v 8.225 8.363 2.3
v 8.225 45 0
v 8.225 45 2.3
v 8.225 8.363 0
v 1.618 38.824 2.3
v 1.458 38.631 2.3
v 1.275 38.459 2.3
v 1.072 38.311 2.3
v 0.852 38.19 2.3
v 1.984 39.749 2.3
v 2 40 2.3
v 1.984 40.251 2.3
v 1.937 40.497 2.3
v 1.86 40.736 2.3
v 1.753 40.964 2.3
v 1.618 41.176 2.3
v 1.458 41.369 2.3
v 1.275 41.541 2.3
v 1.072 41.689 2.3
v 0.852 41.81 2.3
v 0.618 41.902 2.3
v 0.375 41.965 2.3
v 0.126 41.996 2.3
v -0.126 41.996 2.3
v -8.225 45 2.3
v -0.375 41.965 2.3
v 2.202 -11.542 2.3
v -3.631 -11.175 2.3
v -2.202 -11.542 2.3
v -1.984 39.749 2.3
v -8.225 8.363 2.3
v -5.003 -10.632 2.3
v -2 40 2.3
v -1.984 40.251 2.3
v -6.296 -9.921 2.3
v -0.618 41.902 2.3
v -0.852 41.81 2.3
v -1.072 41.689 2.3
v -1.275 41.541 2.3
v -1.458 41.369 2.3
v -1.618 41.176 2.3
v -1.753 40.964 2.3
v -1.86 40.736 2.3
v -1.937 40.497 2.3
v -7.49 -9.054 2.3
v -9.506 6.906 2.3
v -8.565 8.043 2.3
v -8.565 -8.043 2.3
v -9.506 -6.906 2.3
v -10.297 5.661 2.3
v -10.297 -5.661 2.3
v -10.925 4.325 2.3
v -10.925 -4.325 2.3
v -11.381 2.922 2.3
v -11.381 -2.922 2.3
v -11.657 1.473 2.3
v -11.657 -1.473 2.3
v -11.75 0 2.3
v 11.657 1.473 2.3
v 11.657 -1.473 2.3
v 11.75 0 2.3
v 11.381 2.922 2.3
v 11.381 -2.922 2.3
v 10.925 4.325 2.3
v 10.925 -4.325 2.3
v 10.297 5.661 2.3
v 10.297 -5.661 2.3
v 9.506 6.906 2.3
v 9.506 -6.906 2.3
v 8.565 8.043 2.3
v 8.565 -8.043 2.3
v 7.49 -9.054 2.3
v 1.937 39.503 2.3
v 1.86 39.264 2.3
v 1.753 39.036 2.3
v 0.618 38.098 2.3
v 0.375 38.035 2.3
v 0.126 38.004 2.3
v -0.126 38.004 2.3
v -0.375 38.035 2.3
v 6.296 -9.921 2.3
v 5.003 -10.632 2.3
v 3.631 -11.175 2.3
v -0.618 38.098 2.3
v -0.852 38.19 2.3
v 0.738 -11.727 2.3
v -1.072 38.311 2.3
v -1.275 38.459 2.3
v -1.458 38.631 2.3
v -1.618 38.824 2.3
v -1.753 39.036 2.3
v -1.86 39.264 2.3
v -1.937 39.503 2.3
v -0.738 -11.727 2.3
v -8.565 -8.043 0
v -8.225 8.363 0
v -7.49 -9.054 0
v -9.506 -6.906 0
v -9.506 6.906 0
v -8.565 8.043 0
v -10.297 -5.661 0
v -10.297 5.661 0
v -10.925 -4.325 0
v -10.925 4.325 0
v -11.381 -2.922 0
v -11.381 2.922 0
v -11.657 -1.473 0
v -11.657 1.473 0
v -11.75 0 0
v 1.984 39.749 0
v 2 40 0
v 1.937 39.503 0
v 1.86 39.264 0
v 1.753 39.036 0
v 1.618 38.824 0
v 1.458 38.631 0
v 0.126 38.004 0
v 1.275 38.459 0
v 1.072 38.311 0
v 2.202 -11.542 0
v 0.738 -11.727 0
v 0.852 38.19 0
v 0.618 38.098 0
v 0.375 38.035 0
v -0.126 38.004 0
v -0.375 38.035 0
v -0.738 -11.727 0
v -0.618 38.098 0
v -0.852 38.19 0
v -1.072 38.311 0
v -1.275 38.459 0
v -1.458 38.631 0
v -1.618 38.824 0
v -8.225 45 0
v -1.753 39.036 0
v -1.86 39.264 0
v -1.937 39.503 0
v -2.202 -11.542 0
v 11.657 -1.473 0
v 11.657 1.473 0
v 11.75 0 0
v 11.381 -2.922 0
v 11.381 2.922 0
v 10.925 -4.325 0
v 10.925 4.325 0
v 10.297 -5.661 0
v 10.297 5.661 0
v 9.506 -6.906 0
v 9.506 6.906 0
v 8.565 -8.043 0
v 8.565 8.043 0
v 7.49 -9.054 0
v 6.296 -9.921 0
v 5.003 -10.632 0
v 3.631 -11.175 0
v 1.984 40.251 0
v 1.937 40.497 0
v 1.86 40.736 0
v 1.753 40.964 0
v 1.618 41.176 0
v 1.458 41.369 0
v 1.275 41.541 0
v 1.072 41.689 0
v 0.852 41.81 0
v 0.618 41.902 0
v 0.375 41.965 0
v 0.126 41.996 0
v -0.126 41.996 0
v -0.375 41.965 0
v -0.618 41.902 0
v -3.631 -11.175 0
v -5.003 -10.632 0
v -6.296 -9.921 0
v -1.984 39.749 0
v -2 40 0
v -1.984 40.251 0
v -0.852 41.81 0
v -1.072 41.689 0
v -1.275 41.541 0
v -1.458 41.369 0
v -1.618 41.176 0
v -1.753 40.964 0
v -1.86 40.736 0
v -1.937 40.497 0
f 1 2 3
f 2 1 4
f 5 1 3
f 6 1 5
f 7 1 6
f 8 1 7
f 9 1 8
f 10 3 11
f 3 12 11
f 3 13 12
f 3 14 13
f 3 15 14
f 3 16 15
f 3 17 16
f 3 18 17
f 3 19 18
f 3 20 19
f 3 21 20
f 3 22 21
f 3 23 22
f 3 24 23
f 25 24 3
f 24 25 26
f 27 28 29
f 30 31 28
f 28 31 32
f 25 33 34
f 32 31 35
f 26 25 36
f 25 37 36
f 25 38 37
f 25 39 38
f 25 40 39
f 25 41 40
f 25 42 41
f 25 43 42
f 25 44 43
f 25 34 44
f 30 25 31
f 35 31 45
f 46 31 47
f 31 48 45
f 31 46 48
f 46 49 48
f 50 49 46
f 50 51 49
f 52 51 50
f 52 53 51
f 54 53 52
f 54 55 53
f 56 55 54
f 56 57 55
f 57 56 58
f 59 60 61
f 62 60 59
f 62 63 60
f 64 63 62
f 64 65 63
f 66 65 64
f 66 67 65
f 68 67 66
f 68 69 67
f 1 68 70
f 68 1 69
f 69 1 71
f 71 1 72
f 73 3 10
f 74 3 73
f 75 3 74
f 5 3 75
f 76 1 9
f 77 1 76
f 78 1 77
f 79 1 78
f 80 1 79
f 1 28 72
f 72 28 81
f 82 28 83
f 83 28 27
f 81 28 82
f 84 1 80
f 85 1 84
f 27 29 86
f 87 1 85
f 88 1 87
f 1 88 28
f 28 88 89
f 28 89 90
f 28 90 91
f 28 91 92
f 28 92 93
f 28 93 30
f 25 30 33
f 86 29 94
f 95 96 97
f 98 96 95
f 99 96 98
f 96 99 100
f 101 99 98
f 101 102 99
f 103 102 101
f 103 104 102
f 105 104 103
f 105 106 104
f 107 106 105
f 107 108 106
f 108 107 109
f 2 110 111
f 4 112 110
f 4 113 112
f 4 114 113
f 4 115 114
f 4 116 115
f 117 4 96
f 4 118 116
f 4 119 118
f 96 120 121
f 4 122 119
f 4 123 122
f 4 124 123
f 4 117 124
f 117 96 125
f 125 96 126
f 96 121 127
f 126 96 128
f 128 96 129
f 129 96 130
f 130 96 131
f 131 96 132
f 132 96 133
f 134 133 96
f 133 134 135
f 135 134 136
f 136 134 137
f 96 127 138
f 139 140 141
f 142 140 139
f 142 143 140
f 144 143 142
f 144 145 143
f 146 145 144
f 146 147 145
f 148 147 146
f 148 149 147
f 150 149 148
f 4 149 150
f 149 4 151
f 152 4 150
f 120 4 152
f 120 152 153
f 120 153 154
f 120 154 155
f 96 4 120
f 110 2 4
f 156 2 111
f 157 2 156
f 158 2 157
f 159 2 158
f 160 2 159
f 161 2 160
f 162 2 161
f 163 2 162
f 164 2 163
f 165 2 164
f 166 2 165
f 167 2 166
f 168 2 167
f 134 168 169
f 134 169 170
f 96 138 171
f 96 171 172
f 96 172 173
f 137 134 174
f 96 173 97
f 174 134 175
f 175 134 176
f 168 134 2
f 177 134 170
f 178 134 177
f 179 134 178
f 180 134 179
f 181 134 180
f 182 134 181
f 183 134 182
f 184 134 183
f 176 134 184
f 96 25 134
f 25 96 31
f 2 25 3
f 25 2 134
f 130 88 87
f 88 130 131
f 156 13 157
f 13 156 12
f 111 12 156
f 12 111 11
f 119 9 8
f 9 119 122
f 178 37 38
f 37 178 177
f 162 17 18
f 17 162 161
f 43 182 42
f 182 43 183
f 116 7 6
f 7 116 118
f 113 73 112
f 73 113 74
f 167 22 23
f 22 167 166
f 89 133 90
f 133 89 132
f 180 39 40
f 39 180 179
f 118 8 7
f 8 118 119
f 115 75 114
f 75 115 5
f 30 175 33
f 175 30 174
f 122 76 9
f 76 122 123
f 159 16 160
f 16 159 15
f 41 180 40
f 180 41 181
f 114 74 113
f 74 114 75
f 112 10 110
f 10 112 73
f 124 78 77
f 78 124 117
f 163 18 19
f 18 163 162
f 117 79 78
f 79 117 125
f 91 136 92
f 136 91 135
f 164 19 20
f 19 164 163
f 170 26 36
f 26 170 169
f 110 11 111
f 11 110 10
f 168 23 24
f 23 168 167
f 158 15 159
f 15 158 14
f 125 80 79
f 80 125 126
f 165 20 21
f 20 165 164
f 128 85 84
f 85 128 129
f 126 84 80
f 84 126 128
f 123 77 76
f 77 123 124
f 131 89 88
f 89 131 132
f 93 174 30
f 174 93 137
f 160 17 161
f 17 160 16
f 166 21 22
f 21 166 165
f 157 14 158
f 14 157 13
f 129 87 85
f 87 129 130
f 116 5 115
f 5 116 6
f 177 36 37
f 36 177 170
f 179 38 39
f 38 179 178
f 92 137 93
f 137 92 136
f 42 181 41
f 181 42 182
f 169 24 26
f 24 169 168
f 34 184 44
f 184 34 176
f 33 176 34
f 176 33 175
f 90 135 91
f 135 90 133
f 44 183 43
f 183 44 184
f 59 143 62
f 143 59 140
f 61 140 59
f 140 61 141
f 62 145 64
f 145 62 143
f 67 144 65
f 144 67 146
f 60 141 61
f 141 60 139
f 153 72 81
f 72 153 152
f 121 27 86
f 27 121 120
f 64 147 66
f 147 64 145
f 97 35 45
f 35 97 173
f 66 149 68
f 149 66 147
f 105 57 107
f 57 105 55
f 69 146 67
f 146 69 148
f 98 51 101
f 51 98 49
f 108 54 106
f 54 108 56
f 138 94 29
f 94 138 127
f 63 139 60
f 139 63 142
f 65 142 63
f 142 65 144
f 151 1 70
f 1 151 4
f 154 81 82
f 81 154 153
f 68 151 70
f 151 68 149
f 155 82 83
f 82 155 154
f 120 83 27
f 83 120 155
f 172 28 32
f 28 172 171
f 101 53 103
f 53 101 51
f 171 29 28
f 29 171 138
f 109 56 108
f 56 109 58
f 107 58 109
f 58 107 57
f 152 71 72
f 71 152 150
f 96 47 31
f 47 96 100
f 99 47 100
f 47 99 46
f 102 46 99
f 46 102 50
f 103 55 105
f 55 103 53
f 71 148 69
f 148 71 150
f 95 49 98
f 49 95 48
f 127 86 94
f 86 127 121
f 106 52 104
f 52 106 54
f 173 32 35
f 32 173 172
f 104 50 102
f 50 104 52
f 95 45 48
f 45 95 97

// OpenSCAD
// [FL_INDEX: keywords="openscad, 3d_parametric, customizable_supermarket_coin, csg_solid" | COT="Parametric OpenSCAD design from 3DCodeverse"]
// Title: customizable supermarket coin

//Height of the thing. Should be about the same height as the coins.
height = 2.3;
//Diameter of the coin the supermarket carts accept (If they accept two sizes, it's probably a good idea to pick something in between)
coindiameter = 23.5;
//Length of the holderthingy in the back. measured from the senter of the coin
holderlength = 45;
//Optional dxf file if you want to have some logo on your thing. Won't work in customizer, so simply leave it empty.
//dxffile = "teardrop.dxf";
dxffile = "";

module SupermarketCoin(height, coindiameter, holderlength, dxffile = "")  {
	difference() {
		union() {
			cylinder(h=height, r=coindiameter/2, $fn=50);
			
			difference() {
				translate([-coindiameter*0.35, 0, 0])
				cube([coindiameter*0.7, holderlength, height]);
				translate([0, holderlength - 5, 0])
				cylinder(h=height, r=2, $fn=50);
			}
		}
		if (dxffile != "") {
			translate([0,0,height-0.5])
			rotate([0, 0, 180])
			linear_extrude(height=0.5)
			import(dxffile);
		}
	}
}

SupermarketCoin(height, coindiameter, holderlength, dxffile);
